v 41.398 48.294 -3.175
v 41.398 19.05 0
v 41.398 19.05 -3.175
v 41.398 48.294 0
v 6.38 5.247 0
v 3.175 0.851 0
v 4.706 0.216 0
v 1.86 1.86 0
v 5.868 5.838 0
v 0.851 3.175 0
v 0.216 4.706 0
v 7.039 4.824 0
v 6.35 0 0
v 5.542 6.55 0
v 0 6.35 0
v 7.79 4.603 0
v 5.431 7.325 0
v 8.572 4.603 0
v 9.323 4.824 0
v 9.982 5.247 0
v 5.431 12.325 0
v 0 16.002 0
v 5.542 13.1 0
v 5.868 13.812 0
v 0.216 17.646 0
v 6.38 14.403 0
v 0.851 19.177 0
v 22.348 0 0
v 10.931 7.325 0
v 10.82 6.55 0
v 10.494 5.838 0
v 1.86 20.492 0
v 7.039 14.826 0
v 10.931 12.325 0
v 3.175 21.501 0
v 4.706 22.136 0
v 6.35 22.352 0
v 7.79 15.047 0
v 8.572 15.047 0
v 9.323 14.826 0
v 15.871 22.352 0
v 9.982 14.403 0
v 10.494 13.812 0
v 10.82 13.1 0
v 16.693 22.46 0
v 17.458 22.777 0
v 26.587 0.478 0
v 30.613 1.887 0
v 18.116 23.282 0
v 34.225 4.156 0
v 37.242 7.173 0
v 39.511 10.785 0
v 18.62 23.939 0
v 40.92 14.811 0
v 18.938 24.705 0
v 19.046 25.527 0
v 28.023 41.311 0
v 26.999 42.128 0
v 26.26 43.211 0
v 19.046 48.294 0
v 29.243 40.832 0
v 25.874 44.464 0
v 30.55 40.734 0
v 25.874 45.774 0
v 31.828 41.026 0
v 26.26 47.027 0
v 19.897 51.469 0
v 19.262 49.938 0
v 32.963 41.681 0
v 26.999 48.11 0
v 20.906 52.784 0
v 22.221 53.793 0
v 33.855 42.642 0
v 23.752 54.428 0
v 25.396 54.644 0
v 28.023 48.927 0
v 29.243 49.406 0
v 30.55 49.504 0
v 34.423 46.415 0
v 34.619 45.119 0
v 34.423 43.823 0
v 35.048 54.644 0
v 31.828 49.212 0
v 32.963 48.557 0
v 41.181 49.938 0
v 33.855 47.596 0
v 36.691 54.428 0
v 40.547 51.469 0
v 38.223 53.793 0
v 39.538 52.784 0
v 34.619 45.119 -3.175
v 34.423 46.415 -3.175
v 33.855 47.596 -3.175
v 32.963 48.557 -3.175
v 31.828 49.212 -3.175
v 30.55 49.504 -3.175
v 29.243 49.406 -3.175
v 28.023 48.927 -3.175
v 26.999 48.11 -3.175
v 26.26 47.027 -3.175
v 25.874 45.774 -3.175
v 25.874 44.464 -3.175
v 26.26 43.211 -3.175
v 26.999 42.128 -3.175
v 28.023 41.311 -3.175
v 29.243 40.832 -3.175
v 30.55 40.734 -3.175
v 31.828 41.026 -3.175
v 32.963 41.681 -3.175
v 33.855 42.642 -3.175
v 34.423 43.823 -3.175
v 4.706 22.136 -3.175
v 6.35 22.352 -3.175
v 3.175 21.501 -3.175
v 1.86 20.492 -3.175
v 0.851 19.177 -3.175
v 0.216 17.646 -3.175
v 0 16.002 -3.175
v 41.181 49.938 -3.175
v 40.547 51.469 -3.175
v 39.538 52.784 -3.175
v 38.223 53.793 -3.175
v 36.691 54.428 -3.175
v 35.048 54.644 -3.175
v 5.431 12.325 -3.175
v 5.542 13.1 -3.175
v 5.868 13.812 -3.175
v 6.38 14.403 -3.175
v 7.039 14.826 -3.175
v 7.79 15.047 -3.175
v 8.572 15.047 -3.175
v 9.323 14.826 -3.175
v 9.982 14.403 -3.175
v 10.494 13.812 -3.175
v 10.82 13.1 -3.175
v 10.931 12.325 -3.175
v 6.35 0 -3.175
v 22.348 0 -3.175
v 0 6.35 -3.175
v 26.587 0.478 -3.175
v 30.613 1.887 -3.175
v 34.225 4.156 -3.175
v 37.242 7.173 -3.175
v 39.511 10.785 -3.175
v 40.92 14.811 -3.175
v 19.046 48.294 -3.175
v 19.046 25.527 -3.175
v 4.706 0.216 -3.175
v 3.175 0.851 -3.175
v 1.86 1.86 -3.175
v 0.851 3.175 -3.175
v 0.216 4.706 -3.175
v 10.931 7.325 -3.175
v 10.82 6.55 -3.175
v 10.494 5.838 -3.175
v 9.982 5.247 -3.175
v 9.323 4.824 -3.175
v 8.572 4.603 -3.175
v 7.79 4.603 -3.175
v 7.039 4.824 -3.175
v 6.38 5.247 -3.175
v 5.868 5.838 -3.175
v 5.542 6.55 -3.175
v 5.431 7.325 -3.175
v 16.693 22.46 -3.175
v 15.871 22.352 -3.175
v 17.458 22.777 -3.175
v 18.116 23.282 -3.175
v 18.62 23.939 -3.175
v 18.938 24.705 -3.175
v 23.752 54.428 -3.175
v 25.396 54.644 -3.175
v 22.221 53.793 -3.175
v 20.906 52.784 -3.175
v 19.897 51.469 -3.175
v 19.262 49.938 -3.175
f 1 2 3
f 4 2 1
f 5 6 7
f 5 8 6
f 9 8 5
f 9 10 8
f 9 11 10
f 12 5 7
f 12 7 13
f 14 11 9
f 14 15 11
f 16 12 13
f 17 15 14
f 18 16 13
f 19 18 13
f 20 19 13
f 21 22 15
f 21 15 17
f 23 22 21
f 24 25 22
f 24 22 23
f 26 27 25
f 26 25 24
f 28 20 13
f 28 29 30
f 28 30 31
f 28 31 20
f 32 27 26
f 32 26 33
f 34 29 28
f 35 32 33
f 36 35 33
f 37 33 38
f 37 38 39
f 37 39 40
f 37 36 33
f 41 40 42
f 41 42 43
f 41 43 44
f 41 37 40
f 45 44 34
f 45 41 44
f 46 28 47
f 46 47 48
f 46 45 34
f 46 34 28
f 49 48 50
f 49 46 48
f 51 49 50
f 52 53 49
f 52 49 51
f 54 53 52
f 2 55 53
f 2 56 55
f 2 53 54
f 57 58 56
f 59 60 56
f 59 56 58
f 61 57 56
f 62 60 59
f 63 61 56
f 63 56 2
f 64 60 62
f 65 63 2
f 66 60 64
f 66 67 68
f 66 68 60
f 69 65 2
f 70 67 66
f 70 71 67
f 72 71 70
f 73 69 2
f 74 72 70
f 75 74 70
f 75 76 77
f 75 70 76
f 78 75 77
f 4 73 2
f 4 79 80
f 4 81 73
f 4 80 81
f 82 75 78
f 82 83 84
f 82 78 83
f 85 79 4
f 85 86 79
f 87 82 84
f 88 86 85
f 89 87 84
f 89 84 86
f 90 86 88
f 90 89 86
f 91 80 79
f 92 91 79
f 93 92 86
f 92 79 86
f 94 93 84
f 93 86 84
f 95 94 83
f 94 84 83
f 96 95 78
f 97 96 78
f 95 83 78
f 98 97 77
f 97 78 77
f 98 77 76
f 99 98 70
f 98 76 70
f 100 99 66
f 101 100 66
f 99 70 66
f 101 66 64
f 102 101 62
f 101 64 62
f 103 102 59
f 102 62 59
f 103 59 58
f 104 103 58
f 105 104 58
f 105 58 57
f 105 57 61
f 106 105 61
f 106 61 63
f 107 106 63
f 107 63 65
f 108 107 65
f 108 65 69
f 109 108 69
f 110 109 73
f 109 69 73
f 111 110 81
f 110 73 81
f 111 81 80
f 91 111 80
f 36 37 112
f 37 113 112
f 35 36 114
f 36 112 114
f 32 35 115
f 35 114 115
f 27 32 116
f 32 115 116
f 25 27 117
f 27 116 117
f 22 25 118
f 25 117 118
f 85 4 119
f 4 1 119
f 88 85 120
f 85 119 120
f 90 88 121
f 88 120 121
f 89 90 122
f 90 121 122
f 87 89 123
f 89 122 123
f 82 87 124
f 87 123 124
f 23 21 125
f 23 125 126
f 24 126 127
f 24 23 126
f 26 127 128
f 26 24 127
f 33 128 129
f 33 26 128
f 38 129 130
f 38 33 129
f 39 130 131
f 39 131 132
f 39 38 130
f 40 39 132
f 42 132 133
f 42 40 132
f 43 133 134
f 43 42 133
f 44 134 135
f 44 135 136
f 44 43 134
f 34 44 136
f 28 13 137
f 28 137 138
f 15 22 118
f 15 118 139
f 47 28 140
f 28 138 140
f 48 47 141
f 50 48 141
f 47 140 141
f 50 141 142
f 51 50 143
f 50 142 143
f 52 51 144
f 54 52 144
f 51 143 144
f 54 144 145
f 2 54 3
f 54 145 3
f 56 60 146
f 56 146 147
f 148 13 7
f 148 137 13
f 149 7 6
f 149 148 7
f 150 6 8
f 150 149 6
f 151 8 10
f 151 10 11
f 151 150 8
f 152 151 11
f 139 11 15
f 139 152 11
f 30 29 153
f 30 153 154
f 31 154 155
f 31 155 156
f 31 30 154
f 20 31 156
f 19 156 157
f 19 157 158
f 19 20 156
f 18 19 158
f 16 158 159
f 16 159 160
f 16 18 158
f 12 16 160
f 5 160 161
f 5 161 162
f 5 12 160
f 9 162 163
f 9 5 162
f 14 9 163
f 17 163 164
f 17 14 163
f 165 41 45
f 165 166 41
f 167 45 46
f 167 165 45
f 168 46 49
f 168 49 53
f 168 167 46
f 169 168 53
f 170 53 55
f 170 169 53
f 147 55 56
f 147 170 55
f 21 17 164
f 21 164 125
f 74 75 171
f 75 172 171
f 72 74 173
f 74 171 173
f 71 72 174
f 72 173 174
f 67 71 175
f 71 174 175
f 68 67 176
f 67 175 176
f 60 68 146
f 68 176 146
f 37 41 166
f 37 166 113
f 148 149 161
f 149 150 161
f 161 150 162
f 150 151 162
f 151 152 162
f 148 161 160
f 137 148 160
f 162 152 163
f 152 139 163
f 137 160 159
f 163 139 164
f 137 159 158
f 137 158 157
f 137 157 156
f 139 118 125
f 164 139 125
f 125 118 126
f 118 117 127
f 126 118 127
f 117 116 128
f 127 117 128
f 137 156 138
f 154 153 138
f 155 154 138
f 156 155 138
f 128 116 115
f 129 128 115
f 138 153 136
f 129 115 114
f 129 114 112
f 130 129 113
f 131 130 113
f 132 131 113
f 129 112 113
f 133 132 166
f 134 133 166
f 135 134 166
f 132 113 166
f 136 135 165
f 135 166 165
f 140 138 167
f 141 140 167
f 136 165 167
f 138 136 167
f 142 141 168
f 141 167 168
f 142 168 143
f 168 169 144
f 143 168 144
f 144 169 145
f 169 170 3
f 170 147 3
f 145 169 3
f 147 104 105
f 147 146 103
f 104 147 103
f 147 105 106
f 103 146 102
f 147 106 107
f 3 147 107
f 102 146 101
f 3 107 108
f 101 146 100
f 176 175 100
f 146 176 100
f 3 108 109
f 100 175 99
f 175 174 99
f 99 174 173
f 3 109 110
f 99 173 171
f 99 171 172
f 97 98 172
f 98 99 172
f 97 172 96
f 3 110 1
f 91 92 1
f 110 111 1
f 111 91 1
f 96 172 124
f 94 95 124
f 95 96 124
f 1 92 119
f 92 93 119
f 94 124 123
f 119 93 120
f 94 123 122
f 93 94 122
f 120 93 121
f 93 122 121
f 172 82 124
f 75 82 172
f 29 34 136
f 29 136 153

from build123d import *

# Parameters (mm, degrees)
BASE_FLANGE1_DEPTH = 3.175
FILLET1_R          = 6.35
FILLET2_R          = 19.05
FILLET3_R          = 3.175
SKETCH3_R          = 4.396875001
CUT_EXTRUDE1_DEPTH = 3.175


# Sheet-metal steps are written as plain solids
with BuildPart() as part:
    # Sketch1 → Base-Flange1 (new body)
    with BuildSketch(Plane.XY):
        Polygon((0, 0), (41.397840965, 0), (41.397840965, 54.644007143), (19.045840965, 54.644007143), (19.045840965, 22.352), (0, 22.352), align=None)
    extrude(amount=-BASE_FLANGE1_DEPTH)

    # Fillet1
    fillet1_edges = [part.edges().sort_by_distance(p)[0] for p in [
        (0, 22.352, -1.5875),
        (19.045840965, 54.644007143, -1.5875),
        (41.397840965, 54.644007143, -1.5875),
        (0, 0, -1.5875),
    ]]
    fillet(fillet1_edges, radius=FILLET1_R)

    # Fillet2
    fillet2_edges = [part.edges().sort_by_distance(p)[0] for p in [
        (41.397840965, 0, -1.5875),
    ]]
    fillet(fillet2_edges, radius=FILLET2_R)

    # Fillet3
    fillet3_edges = [part.edges().sort_by_distance(p)[0] for p in [
        (19.045840965, 22.352, -1.5875),
    ]]
    fillet(fillet3_edges, radius=FILLET3_R)

    # Sketch3 → Cut-Extrude1 (cut)
    with BuildSketch(Plane.XY):
        with Locations((30.221840965, 45.119007143)):
            Circle(SKETCH3_R)
        with BuildLine():
            Line((10.93094867, 12.325), (10.93094867, 7.325))
            ThreePointArc((10.93094867, 7.325), (8.18094867, 4.575), (5.43094867, 7.325))
            Line((5.43094867, 7.325), (5.43094867, 12.325))
            ThreePointArc((5.43094867, 12.325), (8.18094867, 15.075), (10.93094867, 12.325))
        make_face()
    extrude(amount=-CUT_EXTRUDE1_DEPTH, mode=Mode.SUBTRACT)


solid = part.part
